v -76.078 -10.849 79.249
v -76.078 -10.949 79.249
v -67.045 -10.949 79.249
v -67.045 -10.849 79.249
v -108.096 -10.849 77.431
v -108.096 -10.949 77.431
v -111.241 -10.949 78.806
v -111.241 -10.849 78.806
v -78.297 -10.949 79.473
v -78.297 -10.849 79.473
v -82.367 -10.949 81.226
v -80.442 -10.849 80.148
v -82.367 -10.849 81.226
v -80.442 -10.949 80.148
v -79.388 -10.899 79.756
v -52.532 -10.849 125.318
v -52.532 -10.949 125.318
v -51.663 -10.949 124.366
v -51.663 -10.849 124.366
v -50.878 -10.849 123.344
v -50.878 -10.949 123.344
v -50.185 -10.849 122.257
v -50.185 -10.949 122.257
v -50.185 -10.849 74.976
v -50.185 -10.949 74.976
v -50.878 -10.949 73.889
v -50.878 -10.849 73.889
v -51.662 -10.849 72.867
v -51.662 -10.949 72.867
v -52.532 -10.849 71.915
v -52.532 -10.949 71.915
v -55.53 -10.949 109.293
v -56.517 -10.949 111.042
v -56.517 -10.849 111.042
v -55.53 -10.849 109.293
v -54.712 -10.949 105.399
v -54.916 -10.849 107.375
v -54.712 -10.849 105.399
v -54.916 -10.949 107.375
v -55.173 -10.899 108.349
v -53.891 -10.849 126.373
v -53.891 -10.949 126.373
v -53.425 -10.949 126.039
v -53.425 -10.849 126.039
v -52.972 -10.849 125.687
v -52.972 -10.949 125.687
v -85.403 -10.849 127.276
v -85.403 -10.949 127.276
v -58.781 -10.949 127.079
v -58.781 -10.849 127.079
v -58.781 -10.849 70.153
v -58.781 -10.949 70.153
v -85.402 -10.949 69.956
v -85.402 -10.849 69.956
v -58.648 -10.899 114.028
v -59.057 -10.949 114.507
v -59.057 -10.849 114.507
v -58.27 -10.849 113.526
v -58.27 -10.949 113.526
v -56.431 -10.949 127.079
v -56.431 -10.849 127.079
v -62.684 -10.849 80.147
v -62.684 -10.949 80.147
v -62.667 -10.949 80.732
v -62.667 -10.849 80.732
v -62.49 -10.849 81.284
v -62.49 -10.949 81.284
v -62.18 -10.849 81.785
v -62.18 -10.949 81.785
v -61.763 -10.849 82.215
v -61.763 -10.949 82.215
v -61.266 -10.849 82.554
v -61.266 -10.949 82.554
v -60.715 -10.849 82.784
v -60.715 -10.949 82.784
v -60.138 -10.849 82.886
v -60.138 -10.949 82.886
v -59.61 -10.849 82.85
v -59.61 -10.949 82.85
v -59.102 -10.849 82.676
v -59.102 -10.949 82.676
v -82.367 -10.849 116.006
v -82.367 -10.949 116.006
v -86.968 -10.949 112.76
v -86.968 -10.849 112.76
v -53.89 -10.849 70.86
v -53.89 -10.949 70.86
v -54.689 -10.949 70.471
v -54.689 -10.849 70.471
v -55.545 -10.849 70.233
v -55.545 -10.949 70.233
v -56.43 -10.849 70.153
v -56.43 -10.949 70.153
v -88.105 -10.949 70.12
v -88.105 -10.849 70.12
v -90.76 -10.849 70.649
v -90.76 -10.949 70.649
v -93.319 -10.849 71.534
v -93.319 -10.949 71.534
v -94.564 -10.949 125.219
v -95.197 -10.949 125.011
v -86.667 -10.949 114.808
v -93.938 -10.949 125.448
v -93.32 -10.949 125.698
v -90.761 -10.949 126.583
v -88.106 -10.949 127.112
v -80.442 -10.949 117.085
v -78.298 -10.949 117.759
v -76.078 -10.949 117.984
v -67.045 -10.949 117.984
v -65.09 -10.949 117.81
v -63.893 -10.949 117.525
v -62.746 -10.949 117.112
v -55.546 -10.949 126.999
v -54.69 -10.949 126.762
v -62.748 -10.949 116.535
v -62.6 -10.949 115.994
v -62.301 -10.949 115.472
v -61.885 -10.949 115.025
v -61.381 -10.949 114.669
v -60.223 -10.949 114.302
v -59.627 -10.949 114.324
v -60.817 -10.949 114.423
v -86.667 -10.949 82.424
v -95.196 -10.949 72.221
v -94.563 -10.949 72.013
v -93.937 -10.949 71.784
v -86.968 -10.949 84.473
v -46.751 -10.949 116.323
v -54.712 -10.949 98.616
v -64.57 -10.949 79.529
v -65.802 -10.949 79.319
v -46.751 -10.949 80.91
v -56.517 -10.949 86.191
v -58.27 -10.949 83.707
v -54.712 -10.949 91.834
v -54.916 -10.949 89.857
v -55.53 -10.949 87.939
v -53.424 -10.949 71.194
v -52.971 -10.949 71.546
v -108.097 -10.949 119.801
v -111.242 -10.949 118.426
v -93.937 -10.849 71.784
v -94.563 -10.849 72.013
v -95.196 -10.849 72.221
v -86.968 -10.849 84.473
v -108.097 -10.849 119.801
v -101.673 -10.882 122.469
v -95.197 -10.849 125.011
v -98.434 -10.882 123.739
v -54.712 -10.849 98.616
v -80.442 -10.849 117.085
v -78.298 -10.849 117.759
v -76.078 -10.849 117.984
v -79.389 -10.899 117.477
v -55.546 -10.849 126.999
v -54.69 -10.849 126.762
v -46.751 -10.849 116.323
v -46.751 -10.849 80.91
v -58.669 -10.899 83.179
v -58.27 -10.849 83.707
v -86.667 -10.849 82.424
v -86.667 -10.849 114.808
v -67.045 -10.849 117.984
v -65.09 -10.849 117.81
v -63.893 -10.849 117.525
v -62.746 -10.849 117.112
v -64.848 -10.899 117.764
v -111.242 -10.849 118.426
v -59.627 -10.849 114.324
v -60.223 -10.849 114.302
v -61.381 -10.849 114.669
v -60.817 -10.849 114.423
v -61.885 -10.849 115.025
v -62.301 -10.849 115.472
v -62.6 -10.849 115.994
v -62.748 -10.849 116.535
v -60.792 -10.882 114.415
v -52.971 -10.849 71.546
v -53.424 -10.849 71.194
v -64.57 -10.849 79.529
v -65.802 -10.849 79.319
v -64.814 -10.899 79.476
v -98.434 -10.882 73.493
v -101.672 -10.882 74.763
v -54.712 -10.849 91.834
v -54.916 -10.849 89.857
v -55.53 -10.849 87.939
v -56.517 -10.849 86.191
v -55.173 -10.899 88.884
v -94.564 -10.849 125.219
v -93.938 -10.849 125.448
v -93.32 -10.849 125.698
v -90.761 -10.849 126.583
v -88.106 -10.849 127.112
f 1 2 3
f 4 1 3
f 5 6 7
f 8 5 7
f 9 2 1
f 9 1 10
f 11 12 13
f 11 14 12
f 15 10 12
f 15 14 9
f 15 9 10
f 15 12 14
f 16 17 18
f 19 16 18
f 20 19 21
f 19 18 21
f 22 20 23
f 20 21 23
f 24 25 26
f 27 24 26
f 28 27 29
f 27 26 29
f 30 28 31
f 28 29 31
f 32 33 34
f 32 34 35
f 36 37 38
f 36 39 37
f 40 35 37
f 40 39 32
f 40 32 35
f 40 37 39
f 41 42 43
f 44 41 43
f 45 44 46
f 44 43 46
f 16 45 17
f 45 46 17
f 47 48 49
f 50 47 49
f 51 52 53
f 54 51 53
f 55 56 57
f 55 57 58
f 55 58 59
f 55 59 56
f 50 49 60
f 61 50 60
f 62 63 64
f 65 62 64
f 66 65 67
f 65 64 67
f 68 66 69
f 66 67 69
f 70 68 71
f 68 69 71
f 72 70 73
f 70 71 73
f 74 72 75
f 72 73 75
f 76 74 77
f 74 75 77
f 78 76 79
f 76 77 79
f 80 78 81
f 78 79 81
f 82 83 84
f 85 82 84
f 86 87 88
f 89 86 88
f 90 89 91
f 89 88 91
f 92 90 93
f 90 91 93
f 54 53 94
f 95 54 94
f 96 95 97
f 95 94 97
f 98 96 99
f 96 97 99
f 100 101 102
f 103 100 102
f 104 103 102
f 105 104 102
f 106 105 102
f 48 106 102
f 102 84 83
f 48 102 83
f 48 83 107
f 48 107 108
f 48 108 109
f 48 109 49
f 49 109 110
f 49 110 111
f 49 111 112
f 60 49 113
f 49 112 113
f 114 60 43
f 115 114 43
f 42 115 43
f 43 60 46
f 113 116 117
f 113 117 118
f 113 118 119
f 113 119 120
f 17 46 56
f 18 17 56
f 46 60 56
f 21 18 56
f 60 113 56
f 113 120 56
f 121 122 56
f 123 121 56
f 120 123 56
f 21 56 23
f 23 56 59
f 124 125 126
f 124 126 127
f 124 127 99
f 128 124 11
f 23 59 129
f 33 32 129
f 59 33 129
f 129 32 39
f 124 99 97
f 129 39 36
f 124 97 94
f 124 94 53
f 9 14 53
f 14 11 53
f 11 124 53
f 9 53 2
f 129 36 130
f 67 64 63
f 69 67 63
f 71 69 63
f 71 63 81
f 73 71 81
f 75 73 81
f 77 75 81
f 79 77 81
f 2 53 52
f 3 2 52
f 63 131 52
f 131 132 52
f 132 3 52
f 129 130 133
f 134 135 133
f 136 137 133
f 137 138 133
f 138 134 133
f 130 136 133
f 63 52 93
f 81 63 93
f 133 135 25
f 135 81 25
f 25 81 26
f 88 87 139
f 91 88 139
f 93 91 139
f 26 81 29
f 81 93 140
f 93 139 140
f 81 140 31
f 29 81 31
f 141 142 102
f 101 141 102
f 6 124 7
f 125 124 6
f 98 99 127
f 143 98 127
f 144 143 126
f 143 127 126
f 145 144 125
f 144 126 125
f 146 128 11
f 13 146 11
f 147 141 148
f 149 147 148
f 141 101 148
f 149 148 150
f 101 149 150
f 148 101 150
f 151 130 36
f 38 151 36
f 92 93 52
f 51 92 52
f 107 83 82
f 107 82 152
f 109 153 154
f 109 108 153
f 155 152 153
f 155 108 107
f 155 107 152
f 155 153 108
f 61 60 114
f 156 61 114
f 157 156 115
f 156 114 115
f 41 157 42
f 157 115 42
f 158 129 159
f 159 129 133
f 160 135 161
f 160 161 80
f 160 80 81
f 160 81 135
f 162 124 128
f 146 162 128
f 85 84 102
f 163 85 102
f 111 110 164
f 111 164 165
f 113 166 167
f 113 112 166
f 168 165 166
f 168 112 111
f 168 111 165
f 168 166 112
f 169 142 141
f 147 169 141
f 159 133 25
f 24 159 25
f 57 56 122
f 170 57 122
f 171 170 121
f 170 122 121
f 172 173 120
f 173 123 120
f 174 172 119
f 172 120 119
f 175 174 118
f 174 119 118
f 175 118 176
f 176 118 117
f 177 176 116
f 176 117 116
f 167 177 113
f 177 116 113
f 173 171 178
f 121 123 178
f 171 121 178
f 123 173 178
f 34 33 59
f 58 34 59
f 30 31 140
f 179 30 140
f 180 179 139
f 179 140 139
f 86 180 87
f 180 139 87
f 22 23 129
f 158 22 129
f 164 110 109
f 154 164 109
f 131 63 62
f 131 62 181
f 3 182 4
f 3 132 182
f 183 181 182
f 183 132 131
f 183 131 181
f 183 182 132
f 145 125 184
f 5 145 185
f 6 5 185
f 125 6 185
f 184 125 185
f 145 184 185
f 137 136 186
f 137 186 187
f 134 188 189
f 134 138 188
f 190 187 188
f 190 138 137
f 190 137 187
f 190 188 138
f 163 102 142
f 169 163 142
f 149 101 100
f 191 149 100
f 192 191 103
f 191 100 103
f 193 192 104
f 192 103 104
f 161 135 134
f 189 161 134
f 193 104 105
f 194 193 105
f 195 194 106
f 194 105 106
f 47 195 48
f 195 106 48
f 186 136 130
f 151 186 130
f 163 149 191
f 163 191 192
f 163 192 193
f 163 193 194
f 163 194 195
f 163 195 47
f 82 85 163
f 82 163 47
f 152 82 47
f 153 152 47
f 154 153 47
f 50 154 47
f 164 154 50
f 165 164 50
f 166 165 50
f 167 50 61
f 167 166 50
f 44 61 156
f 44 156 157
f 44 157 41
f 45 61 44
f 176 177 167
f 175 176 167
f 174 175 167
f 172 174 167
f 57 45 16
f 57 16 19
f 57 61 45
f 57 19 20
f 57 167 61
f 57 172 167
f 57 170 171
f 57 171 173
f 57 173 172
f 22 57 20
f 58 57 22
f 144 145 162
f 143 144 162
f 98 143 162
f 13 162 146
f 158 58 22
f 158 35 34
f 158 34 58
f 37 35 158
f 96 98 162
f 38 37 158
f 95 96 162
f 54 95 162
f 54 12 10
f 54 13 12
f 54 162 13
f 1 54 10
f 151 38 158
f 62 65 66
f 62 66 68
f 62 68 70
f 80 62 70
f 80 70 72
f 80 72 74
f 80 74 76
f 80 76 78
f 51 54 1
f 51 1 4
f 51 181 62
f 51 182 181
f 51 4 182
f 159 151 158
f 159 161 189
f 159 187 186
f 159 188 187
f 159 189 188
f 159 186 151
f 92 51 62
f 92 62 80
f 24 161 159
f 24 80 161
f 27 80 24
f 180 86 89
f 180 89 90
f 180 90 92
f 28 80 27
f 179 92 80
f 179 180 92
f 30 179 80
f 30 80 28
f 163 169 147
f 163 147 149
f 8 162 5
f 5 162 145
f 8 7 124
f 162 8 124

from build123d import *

# Parameters (mm, degrees)
EXTRUDE_1_DEPTH = 0.1


with BuildPart() as part:
    # 草图1 → 凸台-拉伸1 (new body)
    with BuildSketch(Plane(origin=(0, -10.949084909, 0), x_dir=(1, 0, 0), z_dir=(0, 1, 0))):
        with BuildLine():
            Line((-67.045080203, -117.983786499), (-76.078205458, -117.983786499))
            add(Edge.make_bspline(
                [(-82.366927771, -116.005961919), (-79.563852737, -117.983786499), (-76.078205458, -117.983786499)],
                knots=[4.075890496, 4.075890496, 4.075890496, 4.712399313, 4.712399313, 4.712399313], degree=2, weights=[1, 0.949783076, 1]))
            Line((-82.366927771, -116.005961919), (-86.967943677, -112.759526398))
            Line((-86.967943677, -112.759526398), (-86.66702356, -114.807769687))
            Line((-86.66702356, -114.807769687), (-111.241670212, -118.425801057))
            Line((-111.241670212, -118.425801057), (-108.0966731, -119.800840581))
            add(Edge.make_bspline(
                [(-108.0966731, -119.800840581), (-105.971797962, -120.729867602), (-103.827924135, -121.613160044), (-100.595217951, -122.897424713), (-99.515004816, -123.318774975), (-97.353838597, -124.159590102), (-96.272482279, -124.578027529), (-95.196799494, -125.010921142)],
                knots=[0, 0, 0, 0, 0.5, 0.5, 0.75, 0.75, 1, 1, 1, 1], degree=3))
            ThreePointArc((-95.196799494, -125.010921142), (-94.249756822, -125.33125391), (-93.31982615, -125.698312286))
            ThreePointArc((-93.31982615, -125.698312286), (-89.442183041, -126.892625888), (-85.402949621, -127.276154819))
            Line((-85.402949621, -127.276154819), (-58.781187755, -127.079371035))
            Line((-58.781187755, -127.079371035), (-56.430656299, -127.079369812))
            ThreePointArc((-56.430656299, -127.079369812), (-55.112439193, -126.899899352), (-53.890746331, -126.373237664))
            ThreePointArc((-53.890746331, -126.373237664), (-53.196333096, -125.865073255), (-52.53246977, -125.317600615))
            ThreePointArc((-52.53246977, -125.317600615), (-51.259593224, -123.863558054), (-50.185329276, -122.257192143))
            Line((-50.185329276, -122.257192143), (-46.750975764, -116.322993851))
            Line((-46.750975764, -116.322993851), (-46.75062646, -80.91004751))
            Line((-46.75062646, -80.91004751), (-50.184862905, -74.975781469))
            ThreePointArc((-50.184862905, -74.975781469), (-51.259095163, -73.369394365), (-52.531943024, -71.915326694))
            ThreePointArc((-52.531943024, -71.915326694), (-53.19579555, -71.367840957), (-53.89019876, -70.859662849))
            ThreePointArc((-53.89019876, -70.859662849), (-55.111881232, -70.33297706), (-56.430094797, -70.153480595))
            Line((-56.430094797, -70.153480595), (-58.780626253, -70.153433003))
            Line((-58.780626253, -70.153433003), (-85.402384232, -69.956124039))
            ThreePointArc((-85.402384232, -69.956124039), (-89.441625217, -70.339573285), (-93.319291886, -71.533810391))
            ThreePointArc((-93.319291886, -71.533810391), (-94.249229798, -71.900850422), (-95.19627879, -72.221164507))
            add(Edge.make_bspline(
                [(-95.19627879, -72.221164507), (-96.271970115, -72.6540369), (-97.353334687, -73.072452994), (-99.514517493, -73.913225487), (-100.59473894, -74.334554439), (-103.827470458, -75.618755334), (-105.97136171, -76.502005483), (-108.096255175, -77.430990586)],
                knots=[0, 0, 0, 0, 0.25, 0.25, 0.5, 0.5, 1, 1, 1, 1], degree=3))
            Line((-108.096255175, -77.430990586), (-111.241279412, -78.805968066))
            Line((-111.241279412, -78.805968066), (-86.66670414, -82.424484231))
            Line((-86.66670414, -82.424484231), (-86.967664664, -84.472721583))
            Line((-86.967664664, -84.472721583), (-82.366584714, -81.22637683))
            add(Edge.make_bspline(
                [(-76.077823385, -79.24867631), (-79.563470664, -79.248607547), (-82.366584714, -81.22637683)],
                knots=[1.570785994, 1.570785994, 1.570785994, 2.207294811, 2.207294811, 2.207294811], degree=2, weights=[1, 0.949783076, 1]))
            Line((-76.077823385, -79.24867631), (-67.044698132, -79.248854511))
            add(Edge.make_bspline(
                [(-62.683601233, -80.146897051), (-64.762697974, -79.248899529), (-67.044698132, -79.248854511)],
                knots=[1.145918634, 1.145918634, 1.145918634, 1.570785994, 1.570785994, 1.570785994], degree=2, weights=[1, 0.977520694, 1]))
            add(Edge.make_bspline(
                [(-62.683601233, -80.146897051), (-62.894449532, -81.896256877), (-60.687964501, -83.473316782), (-59.102374608, -82.676422485)],
                knots=[0, 0, 0, 0, 1, 1, 1, 1], degree=3))
            add(Edge.make_bspline(
                [(-58.26969245, -83.706560633), (-58.651206281, -83.165836905), (-59.102374608, -82.676422485)],
                knots=[0.592759072, 0.592759072, 0.592759072, 0.721677091, 0.721677091, 0.721677091], degree=2, weights=[1, 0.997923237, 1]))
            Line((-58.26969245, -83.706560633), (-56.516625716, -86.191201302))
            add(Edge.make_bspline(
                [(-54.711742979, -91.83369464), (-54.711682133, -88.749367598), (-56.516625716, -86.191201302)],
                knots=[6.283175891, 6.283175891, 6.283175891, 6.87594438, 6.87594438, 6.87594438], degree=2, weights=[1, 0.956398771, 1]))
            Line((-54.711742979, -91.83369464), (-54.711876785, -98.616442891))
            Line((-54.711876785, -98.616442891), (-54.711876785, -105.39918967))
            add(Edge.make_bspline(
                [(-56.516870834, -111.041647402), (-54.711876785, -108.483516713), (-54.711876785, -105.39918967)],
                knots=[2.548833581, 2.548833581, 2.548833581, 3.14160207, 3.14160207, 3.14160207], degree=2, weights=[1, 0.956398771, 1]))
            Line((-56.516870834, -111.041647402), (-58.269986584, -113.526253487))
            add(Edge.make_bspline(
                [(-59.057260101, -114.506771823), (-58.63215538, -114.039537789), (-58.269986584, -113.526253487)],
                knots=[2.426439148, 2.426439148, 2.426439148, 2.548833581, 2.548833581, 2.548833581], degree=2, weights=[1, 0.998128035, 1]))
            add(Edge.make_bspline(
                [(-59.057260101, -114.506771823), (-60.673260847, -113.714088204), (-63.015981908, -115.243372449), (-62.745885648, -117.112344827)],
                knots=[0, 0, 0, 0, 1, 1, 1, 1], degree=3))
            add(Edge.make_bspline(
                [(-67.045080203, -117.983786499), (-64.798566381, -117.983786499), (-62.745885648, -117.112344827)],
                knots=[1.570806659, 1.570806659, 1.570806659, 1.989259675, 1.989259675, 1.989259675], degree=2, weights=[1, 0.978191864, 1]))
        make_face()
    extrude(amount=EXTRUDE_1_DEPTH)


solid = part.part
